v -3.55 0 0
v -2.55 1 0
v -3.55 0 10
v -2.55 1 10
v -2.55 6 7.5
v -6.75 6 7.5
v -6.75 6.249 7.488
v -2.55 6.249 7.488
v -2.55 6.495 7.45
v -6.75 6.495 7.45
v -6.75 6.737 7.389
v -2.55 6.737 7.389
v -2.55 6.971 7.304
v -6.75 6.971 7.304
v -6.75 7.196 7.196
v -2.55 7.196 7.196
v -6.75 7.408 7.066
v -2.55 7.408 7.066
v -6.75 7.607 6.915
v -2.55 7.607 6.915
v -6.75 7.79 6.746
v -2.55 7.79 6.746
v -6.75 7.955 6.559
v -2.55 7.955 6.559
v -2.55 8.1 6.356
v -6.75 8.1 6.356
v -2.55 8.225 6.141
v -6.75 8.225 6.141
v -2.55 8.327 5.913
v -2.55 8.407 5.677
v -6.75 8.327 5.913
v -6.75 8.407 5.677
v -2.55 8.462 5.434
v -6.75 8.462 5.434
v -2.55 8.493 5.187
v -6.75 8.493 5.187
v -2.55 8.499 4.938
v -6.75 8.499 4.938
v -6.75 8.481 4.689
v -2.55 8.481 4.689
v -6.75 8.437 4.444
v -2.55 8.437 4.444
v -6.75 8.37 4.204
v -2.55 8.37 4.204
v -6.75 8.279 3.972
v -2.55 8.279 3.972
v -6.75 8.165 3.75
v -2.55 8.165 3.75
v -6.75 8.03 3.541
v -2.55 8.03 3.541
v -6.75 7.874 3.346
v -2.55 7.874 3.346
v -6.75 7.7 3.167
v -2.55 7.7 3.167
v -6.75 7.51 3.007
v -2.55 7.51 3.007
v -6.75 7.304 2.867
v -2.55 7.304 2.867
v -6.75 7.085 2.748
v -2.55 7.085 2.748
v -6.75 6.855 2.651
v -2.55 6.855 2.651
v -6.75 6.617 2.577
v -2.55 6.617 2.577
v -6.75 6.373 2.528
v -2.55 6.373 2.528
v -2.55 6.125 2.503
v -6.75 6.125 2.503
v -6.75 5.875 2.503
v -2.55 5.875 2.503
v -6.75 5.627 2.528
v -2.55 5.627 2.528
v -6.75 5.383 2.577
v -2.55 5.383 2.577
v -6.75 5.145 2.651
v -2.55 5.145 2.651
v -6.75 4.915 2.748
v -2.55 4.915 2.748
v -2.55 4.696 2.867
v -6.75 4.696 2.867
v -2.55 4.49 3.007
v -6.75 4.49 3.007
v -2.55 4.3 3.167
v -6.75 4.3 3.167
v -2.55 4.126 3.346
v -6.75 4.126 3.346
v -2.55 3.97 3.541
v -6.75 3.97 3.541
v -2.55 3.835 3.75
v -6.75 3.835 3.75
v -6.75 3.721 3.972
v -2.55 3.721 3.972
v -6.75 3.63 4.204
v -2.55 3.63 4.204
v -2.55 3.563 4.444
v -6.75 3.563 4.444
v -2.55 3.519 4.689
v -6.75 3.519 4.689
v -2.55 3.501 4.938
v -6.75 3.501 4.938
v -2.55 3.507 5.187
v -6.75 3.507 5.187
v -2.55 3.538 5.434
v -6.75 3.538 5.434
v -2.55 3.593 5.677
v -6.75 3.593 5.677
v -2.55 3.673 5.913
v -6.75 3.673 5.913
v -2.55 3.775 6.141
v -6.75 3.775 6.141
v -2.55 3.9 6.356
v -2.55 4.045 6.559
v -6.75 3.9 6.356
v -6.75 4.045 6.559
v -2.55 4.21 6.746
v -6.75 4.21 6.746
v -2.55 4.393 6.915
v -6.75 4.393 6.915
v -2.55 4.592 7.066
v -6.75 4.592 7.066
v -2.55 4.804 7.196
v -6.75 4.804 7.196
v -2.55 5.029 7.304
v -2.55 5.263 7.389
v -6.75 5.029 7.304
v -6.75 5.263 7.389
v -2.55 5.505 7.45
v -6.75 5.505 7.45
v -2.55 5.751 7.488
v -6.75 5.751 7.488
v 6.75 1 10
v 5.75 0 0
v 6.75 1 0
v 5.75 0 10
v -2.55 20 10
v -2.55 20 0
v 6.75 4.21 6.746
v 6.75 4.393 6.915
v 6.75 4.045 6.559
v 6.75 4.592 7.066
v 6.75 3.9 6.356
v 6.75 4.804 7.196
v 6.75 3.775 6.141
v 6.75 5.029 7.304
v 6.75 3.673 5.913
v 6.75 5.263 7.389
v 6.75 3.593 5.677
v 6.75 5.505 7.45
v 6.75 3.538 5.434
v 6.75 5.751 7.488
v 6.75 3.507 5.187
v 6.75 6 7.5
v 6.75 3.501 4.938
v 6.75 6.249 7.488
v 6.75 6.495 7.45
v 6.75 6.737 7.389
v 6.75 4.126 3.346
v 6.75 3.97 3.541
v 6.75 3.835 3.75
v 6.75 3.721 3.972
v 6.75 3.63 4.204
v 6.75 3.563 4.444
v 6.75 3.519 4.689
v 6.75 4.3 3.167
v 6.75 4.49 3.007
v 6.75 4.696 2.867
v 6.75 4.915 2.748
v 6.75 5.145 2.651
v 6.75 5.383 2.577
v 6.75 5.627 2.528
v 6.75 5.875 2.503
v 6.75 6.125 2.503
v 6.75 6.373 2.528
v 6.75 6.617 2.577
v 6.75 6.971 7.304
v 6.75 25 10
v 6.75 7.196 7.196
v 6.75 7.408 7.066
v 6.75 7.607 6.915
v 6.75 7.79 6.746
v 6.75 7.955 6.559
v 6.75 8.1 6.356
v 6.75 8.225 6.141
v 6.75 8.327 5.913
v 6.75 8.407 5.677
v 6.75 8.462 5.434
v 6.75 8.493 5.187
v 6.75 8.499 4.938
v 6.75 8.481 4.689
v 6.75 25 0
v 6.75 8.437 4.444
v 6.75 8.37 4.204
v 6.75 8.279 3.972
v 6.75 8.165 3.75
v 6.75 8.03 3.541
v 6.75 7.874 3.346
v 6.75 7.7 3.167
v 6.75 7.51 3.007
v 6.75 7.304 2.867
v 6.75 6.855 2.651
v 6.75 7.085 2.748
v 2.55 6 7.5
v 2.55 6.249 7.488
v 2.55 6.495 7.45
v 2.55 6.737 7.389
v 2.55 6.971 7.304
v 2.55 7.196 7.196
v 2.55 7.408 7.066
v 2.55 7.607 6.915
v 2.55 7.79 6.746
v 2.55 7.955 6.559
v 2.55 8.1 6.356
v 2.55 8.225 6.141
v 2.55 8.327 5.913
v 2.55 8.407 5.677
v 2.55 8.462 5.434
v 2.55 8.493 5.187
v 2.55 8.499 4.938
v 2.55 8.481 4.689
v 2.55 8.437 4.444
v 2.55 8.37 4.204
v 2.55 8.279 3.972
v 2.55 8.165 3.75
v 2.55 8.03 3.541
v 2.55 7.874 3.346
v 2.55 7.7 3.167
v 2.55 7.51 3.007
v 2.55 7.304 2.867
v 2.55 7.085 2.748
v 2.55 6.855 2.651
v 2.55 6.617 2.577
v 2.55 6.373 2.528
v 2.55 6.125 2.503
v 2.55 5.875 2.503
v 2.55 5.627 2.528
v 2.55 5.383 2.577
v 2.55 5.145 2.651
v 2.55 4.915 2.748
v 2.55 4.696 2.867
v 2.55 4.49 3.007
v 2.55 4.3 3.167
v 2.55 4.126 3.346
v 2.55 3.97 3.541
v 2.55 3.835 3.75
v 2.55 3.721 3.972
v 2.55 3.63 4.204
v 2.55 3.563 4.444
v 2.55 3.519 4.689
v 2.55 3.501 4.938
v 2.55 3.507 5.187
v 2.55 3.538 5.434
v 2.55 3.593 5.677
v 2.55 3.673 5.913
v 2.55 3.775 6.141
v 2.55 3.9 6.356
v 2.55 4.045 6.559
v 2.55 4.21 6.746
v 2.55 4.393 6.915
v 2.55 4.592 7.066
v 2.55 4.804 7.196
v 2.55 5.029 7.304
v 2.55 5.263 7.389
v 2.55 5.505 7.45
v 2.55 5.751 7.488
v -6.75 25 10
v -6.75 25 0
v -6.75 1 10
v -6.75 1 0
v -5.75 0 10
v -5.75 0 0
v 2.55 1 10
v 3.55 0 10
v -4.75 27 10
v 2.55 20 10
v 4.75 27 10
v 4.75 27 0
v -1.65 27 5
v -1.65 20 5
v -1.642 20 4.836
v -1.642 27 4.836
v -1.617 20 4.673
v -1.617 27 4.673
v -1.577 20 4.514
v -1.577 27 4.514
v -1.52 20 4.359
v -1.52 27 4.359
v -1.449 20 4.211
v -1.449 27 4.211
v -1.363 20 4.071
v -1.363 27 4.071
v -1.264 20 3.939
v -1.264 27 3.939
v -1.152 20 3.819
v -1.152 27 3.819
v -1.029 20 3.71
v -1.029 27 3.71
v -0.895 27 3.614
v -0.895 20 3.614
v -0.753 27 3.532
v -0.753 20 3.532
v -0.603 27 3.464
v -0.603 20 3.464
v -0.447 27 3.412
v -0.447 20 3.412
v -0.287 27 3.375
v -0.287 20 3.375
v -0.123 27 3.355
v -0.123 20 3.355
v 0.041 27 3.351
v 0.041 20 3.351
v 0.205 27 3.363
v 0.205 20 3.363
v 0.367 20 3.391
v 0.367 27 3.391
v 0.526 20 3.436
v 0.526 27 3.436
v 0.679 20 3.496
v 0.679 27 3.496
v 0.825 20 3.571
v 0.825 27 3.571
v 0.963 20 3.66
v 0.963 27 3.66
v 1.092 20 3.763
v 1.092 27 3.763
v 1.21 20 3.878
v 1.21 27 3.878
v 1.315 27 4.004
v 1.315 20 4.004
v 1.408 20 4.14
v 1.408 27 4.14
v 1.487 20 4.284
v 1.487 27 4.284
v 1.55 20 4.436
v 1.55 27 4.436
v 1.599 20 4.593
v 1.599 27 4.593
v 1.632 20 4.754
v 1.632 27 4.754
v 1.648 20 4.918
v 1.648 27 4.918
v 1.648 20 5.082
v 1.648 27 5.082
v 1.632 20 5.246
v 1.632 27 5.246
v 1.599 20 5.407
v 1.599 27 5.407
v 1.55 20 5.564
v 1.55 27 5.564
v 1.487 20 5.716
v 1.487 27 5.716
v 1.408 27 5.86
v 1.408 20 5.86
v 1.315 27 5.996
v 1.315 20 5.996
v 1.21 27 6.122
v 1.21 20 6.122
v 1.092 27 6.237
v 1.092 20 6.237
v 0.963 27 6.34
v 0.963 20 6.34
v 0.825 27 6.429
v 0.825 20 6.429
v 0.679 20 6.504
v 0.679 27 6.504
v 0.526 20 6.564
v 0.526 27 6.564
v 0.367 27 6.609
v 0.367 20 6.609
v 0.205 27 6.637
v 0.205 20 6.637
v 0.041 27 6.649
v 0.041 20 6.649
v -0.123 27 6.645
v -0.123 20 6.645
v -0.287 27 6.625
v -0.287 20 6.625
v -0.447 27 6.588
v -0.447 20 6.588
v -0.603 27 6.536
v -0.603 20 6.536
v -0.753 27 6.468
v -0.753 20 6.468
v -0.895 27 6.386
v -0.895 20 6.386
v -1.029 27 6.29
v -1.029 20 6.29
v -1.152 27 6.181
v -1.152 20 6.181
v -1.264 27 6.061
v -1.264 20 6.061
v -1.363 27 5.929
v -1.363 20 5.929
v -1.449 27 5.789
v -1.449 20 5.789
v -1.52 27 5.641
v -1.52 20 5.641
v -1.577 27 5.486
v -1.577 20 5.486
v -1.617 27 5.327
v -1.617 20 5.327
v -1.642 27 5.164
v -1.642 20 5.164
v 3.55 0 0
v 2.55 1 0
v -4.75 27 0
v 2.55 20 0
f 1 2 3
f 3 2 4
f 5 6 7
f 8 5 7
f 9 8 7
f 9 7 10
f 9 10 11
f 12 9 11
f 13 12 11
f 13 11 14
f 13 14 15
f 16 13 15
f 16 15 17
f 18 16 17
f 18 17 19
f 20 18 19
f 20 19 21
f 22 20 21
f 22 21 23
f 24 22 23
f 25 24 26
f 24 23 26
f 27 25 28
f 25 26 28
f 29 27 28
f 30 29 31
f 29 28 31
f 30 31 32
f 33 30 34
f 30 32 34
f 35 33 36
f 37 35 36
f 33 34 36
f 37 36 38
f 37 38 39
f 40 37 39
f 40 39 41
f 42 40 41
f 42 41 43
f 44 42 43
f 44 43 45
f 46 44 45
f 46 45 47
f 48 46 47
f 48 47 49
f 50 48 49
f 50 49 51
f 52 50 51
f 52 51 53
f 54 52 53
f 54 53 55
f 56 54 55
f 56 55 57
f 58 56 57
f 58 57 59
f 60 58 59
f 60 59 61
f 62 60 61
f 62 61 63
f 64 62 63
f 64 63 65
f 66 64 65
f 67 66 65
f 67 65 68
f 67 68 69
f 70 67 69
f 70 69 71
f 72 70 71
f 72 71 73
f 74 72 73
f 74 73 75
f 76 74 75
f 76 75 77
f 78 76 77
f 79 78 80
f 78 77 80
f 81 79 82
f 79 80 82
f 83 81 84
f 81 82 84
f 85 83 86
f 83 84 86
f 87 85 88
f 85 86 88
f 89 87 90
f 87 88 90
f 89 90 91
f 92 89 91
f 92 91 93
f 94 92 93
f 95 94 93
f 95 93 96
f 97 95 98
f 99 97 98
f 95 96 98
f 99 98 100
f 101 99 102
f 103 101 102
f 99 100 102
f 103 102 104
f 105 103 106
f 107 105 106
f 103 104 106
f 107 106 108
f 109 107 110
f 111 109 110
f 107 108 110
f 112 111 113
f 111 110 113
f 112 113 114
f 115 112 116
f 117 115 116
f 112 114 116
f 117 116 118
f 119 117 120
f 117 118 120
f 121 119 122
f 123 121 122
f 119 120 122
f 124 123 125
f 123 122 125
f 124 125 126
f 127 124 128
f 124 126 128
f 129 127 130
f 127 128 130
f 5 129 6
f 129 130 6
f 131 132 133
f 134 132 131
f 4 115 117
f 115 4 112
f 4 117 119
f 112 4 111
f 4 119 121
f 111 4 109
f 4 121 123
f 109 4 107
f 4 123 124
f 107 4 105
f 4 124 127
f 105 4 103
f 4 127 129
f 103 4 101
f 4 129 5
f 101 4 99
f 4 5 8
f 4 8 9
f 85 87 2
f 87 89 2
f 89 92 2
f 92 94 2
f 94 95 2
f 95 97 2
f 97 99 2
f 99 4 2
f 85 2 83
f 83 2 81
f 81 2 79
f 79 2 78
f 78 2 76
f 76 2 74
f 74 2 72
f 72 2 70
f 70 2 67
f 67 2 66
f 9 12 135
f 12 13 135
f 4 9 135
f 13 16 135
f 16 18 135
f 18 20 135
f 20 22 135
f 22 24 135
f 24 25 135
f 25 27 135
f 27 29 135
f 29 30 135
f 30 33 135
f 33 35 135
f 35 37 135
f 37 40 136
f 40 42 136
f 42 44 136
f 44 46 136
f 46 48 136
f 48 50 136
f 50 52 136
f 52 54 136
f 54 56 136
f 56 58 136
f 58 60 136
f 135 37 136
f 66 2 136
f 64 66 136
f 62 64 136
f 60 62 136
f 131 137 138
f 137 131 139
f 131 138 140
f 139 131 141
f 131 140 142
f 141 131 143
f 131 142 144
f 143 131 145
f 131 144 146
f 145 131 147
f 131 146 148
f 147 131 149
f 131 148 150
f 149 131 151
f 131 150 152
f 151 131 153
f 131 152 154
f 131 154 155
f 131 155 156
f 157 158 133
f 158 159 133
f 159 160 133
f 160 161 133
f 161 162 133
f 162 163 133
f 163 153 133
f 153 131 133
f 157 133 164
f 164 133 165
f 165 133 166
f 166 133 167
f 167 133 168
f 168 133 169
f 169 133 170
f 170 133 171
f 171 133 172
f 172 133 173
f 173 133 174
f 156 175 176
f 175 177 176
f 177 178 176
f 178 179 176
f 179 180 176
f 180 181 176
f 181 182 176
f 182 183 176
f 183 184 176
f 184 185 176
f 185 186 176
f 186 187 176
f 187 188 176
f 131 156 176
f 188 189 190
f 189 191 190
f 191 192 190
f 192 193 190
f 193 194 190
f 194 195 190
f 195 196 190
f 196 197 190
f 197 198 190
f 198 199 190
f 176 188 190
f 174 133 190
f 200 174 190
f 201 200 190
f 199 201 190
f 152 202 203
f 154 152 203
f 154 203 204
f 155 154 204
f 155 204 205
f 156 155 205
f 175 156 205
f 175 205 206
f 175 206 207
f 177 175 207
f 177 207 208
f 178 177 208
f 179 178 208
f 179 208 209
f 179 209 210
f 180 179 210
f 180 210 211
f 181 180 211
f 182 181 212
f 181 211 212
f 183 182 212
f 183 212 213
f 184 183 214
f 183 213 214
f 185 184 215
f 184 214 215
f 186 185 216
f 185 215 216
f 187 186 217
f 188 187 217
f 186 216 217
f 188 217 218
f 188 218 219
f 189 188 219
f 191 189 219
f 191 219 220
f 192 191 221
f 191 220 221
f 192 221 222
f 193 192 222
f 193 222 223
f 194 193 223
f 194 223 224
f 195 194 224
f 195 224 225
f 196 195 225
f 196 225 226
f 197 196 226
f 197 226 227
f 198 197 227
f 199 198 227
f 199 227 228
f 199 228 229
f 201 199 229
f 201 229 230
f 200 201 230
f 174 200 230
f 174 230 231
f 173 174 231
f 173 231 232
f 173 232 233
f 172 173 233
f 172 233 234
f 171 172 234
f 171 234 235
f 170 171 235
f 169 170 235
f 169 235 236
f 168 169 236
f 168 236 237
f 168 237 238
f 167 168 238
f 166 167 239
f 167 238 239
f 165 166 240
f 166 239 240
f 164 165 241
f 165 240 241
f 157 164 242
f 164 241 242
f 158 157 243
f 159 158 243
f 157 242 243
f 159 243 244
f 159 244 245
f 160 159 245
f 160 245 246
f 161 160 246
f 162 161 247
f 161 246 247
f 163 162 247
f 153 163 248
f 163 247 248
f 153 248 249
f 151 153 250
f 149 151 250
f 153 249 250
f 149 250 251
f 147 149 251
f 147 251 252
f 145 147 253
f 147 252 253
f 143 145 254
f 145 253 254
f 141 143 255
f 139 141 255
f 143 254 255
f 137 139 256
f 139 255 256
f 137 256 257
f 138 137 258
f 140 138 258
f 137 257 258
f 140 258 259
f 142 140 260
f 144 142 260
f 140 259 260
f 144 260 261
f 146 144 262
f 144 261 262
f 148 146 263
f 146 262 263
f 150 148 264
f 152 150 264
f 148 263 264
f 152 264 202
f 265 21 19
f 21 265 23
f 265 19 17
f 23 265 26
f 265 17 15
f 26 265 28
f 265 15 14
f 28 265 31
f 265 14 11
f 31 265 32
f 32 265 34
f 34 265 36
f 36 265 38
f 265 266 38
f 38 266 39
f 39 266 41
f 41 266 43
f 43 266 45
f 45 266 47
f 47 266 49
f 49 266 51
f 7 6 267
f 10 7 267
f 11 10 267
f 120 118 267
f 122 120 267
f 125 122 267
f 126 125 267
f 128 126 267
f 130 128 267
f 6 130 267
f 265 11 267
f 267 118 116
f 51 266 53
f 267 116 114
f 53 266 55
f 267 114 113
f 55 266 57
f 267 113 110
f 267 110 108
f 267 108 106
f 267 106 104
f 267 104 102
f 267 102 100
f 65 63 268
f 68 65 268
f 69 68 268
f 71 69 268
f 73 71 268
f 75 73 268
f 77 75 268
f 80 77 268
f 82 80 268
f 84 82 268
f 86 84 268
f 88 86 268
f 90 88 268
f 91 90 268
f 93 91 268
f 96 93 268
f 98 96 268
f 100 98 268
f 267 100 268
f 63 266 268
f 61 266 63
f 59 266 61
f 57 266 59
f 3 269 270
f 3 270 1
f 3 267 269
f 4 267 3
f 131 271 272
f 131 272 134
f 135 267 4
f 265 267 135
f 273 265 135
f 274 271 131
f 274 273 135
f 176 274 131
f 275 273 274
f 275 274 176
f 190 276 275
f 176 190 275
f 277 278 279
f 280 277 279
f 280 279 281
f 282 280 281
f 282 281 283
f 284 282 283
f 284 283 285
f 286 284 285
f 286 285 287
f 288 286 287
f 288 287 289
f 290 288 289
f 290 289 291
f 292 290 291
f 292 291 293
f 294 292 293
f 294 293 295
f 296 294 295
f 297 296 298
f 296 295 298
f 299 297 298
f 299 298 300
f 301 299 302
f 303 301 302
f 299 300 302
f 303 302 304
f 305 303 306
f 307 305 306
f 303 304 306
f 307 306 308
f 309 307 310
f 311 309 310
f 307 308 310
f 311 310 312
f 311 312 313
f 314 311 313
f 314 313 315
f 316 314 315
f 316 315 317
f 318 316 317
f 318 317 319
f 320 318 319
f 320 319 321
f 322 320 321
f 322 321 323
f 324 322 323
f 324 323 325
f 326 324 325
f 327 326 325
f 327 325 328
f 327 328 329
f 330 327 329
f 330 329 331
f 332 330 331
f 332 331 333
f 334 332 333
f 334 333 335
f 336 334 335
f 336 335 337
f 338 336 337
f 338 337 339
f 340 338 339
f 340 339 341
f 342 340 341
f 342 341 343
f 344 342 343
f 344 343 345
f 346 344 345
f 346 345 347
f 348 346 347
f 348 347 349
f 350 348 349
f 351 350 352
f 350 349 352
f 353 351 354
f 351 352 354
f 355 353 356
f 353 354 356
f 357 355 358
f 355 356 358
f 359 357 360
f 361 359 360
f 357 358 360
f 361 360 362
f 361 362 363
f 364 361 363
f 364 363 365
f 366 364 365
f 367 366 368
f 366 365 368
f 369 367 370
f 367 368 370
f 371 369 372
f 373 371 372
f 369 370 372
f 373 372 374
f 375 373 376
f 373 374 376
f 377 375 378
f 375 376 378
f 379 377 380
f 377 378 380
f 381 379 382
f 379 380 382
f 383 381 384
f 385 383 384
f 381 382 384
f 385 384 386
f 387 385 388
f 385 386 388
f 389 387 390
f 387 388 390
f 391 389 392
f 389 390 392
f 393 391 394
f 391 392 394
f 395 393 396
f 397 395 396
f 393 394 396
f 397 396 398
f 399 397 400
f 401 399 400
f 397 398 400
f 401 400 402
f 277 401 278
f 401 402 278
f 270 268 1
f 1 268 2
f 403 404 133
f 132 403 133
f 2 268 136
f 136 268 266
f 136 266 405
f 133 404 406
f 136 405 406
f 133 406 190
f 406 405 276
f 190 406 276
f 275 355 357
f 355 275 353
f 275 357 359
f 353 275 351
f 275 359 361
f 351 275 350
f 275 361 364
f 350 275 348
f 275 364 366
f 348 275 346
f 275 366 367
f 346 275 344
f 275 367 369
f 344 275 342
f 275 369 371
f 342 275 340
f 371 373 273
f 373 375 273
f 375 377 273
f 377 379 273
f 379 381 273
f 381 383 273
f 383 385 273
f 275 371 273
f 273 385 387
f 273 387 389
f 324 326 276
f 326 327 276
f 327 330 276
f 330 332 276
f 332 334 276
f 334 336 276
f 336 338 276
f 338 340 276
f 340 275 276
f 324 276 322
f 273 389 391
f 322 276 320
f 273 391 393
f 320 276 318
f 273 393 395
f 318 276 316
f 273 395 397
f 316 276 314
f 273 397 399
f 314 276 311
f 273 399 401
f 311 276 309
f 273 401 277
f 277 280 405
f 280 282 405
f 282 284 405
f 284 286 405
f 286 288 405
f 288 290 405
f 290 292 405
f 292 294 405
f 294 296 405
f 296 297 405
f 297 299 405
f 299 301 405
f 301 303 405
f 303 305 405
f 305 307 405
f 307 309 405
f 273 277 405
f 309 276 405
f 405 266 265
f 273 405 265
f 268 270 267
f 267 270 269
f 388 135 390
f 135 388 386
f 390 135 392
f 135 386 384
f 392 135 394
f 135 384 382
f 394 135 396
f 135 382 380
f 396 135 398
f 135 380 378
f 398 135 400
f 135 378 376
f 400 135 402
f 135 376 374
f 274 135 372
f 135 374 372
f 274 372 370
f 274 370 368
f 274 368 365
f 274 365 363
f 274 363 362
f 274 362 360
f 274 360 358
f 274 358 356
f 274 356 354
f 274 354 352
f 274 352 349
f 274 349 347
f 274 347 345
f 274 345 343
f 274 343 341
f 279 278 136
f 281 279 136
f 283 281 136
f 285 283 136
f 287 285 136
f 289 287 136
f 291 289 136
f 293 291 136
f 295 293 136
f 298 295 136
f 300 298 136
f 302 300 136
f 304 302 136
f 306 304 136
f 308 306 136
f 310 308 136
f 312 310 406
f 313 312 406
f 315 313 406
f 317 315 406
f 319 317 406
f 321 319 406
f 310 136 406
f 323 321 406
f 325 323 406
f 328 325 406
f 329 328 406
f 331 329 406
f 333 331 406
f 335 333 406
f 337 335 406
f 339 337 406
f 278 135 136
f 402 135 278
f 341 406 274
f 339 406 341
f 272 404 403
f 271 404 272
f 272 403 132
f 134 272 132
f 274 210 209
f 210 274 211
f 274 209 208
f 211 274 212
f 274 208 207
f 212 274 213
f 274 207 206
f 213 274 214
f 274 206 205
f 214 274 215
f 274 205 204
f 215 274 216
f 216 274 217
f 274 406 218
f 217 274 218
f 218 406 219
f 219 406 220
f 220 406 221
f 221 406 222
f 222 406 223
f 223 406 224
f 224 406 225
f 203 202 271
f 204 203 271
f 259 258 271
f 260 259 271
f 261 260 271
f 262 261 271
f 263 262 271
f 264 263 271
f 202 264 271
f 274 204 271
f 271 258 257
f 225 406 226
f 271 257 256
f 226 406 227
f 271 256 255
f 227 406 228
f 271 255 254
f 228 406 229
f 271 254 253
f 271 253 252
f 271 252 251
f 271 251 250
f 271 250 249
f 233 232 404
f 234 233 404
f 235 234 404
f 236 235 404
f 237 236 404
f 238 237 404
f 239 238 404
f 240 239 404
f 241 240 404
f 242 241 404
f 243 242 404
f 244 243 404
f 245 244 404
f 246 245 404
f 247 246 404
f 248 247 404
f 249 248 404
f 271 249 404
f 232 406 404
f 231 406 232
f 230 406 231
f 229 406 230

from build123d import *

# Parameters (mm, degrees)
EXTRUDE_1_DEPTH     = 10
SKETCH_2_R          = 2.5
CUT_EXTRUDE_1_DEPTH = 13.5
HOLE_WIZARD_M4_1_D  = 3.3
CHAMFER_1_SIZE      = 1
CHAMFER_2_SIZE      = 2


with BuildPart() as part:
    # 草图1 → 凸台-拉伸1 (new body)
    with BuildSketch(Plane.XY):
        Polygon((6.75, 0), (6.75, 27), (-6.75, 27), (-6.75, 0), (-2.55, 0), (-2.55, 20), (2.55, 20), (2.55, 0), align=None)
    extrude(amount=EXTRUDE_1_DEPTH)

    # 草图2 → 切除-拉伸1 (cut)
    with BuildSketch(Plane.ZY.offset(6.75)):
        with Locations((5, 6)):
            Circle(SKETCH_2_R)
    extrude(amount=-CUT_EXTRUDE_1_DEPTH, mode=Mode.SUBTRACT)

    # M4 螺纹孔1 (through all)
    with Locations(Plane(origin=(0, 27, 0), x_dir=(1, 0, 0), z_dir=(0, 1, 0))):
        with Locations((0, -5)):
            Hole(HOLE_WIZARD_M4_1_D / 2)

    # 倒角1
    chamfer_1_edges = [part.edges().sort_by_distance(p)[0] for p in [
        (6.75, 0, 5),
        (2.55, 0, 5),
        (-2.55, 0, 5),
        (-6.75, 0, 5),
    ]]
    chamfer(chamfer_1_edges, length=CHAMFER_1_SIZE)

    # 倒角2
    chamfer_2_edges = [part.edges().sort_by_distance(p)[0] for p in [
        (-6.75, 27, 5),
        (6.75, 27, 5),
    ]]
    chamfer(chamfer_2_edges, length=CHAMFER_2_SIZE)


solid = part.part
